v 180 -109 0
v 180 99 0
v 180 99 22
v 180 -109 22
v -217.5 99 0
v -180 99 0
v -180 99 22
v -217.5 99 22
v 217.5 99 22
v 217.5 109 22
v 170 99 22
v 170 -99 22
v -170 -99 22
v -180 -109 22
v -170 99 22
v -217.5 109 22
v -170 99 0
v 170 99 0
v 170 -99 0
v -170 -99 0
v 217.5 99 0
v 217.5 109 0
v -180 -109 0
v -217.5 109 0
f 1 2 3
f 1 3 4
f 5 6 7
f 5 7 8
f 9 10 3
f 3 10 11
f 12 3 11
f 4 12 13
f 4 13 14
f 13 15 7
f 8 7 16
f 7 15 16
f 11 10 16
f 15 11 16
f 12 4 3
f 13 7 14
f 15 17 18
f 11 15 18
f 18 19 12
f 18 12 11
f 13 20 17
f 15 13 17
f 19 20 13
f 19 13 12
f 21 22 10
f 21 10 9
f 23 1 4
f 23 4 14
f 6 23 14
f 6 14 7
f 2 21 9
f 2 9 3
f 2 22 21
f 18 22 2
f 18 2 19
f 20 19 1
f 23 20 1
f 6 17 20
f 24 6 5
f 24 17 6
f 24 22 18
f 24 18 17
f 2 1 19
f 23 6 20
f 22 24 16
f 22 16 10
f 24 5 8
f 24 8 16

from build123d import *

# Parameters (mm, degrees)
SKETCH1_W           = 340
SKETCH1_H           = 198
BOSS_EXTRUDE1_DEPTH = 22


with BuildPart() as part:
    # Sketch1 → Boss-Extrude1 (new body)
    with BuildSketch(Plane.XY):
        Polygon((-217.5, 109), (217.5, 109), (217.5, 99), (180, 99), (180, -109), (-180, -109), (-180, 99), (-217.5, 99), align=None)
        Rectangle(SKETCH1_W, SKETCH1_H, mode=Mode.SUBTRACT)
    extrude(amount=BOSS_EXTRUDE1_DEPTH)


solid = part.part
